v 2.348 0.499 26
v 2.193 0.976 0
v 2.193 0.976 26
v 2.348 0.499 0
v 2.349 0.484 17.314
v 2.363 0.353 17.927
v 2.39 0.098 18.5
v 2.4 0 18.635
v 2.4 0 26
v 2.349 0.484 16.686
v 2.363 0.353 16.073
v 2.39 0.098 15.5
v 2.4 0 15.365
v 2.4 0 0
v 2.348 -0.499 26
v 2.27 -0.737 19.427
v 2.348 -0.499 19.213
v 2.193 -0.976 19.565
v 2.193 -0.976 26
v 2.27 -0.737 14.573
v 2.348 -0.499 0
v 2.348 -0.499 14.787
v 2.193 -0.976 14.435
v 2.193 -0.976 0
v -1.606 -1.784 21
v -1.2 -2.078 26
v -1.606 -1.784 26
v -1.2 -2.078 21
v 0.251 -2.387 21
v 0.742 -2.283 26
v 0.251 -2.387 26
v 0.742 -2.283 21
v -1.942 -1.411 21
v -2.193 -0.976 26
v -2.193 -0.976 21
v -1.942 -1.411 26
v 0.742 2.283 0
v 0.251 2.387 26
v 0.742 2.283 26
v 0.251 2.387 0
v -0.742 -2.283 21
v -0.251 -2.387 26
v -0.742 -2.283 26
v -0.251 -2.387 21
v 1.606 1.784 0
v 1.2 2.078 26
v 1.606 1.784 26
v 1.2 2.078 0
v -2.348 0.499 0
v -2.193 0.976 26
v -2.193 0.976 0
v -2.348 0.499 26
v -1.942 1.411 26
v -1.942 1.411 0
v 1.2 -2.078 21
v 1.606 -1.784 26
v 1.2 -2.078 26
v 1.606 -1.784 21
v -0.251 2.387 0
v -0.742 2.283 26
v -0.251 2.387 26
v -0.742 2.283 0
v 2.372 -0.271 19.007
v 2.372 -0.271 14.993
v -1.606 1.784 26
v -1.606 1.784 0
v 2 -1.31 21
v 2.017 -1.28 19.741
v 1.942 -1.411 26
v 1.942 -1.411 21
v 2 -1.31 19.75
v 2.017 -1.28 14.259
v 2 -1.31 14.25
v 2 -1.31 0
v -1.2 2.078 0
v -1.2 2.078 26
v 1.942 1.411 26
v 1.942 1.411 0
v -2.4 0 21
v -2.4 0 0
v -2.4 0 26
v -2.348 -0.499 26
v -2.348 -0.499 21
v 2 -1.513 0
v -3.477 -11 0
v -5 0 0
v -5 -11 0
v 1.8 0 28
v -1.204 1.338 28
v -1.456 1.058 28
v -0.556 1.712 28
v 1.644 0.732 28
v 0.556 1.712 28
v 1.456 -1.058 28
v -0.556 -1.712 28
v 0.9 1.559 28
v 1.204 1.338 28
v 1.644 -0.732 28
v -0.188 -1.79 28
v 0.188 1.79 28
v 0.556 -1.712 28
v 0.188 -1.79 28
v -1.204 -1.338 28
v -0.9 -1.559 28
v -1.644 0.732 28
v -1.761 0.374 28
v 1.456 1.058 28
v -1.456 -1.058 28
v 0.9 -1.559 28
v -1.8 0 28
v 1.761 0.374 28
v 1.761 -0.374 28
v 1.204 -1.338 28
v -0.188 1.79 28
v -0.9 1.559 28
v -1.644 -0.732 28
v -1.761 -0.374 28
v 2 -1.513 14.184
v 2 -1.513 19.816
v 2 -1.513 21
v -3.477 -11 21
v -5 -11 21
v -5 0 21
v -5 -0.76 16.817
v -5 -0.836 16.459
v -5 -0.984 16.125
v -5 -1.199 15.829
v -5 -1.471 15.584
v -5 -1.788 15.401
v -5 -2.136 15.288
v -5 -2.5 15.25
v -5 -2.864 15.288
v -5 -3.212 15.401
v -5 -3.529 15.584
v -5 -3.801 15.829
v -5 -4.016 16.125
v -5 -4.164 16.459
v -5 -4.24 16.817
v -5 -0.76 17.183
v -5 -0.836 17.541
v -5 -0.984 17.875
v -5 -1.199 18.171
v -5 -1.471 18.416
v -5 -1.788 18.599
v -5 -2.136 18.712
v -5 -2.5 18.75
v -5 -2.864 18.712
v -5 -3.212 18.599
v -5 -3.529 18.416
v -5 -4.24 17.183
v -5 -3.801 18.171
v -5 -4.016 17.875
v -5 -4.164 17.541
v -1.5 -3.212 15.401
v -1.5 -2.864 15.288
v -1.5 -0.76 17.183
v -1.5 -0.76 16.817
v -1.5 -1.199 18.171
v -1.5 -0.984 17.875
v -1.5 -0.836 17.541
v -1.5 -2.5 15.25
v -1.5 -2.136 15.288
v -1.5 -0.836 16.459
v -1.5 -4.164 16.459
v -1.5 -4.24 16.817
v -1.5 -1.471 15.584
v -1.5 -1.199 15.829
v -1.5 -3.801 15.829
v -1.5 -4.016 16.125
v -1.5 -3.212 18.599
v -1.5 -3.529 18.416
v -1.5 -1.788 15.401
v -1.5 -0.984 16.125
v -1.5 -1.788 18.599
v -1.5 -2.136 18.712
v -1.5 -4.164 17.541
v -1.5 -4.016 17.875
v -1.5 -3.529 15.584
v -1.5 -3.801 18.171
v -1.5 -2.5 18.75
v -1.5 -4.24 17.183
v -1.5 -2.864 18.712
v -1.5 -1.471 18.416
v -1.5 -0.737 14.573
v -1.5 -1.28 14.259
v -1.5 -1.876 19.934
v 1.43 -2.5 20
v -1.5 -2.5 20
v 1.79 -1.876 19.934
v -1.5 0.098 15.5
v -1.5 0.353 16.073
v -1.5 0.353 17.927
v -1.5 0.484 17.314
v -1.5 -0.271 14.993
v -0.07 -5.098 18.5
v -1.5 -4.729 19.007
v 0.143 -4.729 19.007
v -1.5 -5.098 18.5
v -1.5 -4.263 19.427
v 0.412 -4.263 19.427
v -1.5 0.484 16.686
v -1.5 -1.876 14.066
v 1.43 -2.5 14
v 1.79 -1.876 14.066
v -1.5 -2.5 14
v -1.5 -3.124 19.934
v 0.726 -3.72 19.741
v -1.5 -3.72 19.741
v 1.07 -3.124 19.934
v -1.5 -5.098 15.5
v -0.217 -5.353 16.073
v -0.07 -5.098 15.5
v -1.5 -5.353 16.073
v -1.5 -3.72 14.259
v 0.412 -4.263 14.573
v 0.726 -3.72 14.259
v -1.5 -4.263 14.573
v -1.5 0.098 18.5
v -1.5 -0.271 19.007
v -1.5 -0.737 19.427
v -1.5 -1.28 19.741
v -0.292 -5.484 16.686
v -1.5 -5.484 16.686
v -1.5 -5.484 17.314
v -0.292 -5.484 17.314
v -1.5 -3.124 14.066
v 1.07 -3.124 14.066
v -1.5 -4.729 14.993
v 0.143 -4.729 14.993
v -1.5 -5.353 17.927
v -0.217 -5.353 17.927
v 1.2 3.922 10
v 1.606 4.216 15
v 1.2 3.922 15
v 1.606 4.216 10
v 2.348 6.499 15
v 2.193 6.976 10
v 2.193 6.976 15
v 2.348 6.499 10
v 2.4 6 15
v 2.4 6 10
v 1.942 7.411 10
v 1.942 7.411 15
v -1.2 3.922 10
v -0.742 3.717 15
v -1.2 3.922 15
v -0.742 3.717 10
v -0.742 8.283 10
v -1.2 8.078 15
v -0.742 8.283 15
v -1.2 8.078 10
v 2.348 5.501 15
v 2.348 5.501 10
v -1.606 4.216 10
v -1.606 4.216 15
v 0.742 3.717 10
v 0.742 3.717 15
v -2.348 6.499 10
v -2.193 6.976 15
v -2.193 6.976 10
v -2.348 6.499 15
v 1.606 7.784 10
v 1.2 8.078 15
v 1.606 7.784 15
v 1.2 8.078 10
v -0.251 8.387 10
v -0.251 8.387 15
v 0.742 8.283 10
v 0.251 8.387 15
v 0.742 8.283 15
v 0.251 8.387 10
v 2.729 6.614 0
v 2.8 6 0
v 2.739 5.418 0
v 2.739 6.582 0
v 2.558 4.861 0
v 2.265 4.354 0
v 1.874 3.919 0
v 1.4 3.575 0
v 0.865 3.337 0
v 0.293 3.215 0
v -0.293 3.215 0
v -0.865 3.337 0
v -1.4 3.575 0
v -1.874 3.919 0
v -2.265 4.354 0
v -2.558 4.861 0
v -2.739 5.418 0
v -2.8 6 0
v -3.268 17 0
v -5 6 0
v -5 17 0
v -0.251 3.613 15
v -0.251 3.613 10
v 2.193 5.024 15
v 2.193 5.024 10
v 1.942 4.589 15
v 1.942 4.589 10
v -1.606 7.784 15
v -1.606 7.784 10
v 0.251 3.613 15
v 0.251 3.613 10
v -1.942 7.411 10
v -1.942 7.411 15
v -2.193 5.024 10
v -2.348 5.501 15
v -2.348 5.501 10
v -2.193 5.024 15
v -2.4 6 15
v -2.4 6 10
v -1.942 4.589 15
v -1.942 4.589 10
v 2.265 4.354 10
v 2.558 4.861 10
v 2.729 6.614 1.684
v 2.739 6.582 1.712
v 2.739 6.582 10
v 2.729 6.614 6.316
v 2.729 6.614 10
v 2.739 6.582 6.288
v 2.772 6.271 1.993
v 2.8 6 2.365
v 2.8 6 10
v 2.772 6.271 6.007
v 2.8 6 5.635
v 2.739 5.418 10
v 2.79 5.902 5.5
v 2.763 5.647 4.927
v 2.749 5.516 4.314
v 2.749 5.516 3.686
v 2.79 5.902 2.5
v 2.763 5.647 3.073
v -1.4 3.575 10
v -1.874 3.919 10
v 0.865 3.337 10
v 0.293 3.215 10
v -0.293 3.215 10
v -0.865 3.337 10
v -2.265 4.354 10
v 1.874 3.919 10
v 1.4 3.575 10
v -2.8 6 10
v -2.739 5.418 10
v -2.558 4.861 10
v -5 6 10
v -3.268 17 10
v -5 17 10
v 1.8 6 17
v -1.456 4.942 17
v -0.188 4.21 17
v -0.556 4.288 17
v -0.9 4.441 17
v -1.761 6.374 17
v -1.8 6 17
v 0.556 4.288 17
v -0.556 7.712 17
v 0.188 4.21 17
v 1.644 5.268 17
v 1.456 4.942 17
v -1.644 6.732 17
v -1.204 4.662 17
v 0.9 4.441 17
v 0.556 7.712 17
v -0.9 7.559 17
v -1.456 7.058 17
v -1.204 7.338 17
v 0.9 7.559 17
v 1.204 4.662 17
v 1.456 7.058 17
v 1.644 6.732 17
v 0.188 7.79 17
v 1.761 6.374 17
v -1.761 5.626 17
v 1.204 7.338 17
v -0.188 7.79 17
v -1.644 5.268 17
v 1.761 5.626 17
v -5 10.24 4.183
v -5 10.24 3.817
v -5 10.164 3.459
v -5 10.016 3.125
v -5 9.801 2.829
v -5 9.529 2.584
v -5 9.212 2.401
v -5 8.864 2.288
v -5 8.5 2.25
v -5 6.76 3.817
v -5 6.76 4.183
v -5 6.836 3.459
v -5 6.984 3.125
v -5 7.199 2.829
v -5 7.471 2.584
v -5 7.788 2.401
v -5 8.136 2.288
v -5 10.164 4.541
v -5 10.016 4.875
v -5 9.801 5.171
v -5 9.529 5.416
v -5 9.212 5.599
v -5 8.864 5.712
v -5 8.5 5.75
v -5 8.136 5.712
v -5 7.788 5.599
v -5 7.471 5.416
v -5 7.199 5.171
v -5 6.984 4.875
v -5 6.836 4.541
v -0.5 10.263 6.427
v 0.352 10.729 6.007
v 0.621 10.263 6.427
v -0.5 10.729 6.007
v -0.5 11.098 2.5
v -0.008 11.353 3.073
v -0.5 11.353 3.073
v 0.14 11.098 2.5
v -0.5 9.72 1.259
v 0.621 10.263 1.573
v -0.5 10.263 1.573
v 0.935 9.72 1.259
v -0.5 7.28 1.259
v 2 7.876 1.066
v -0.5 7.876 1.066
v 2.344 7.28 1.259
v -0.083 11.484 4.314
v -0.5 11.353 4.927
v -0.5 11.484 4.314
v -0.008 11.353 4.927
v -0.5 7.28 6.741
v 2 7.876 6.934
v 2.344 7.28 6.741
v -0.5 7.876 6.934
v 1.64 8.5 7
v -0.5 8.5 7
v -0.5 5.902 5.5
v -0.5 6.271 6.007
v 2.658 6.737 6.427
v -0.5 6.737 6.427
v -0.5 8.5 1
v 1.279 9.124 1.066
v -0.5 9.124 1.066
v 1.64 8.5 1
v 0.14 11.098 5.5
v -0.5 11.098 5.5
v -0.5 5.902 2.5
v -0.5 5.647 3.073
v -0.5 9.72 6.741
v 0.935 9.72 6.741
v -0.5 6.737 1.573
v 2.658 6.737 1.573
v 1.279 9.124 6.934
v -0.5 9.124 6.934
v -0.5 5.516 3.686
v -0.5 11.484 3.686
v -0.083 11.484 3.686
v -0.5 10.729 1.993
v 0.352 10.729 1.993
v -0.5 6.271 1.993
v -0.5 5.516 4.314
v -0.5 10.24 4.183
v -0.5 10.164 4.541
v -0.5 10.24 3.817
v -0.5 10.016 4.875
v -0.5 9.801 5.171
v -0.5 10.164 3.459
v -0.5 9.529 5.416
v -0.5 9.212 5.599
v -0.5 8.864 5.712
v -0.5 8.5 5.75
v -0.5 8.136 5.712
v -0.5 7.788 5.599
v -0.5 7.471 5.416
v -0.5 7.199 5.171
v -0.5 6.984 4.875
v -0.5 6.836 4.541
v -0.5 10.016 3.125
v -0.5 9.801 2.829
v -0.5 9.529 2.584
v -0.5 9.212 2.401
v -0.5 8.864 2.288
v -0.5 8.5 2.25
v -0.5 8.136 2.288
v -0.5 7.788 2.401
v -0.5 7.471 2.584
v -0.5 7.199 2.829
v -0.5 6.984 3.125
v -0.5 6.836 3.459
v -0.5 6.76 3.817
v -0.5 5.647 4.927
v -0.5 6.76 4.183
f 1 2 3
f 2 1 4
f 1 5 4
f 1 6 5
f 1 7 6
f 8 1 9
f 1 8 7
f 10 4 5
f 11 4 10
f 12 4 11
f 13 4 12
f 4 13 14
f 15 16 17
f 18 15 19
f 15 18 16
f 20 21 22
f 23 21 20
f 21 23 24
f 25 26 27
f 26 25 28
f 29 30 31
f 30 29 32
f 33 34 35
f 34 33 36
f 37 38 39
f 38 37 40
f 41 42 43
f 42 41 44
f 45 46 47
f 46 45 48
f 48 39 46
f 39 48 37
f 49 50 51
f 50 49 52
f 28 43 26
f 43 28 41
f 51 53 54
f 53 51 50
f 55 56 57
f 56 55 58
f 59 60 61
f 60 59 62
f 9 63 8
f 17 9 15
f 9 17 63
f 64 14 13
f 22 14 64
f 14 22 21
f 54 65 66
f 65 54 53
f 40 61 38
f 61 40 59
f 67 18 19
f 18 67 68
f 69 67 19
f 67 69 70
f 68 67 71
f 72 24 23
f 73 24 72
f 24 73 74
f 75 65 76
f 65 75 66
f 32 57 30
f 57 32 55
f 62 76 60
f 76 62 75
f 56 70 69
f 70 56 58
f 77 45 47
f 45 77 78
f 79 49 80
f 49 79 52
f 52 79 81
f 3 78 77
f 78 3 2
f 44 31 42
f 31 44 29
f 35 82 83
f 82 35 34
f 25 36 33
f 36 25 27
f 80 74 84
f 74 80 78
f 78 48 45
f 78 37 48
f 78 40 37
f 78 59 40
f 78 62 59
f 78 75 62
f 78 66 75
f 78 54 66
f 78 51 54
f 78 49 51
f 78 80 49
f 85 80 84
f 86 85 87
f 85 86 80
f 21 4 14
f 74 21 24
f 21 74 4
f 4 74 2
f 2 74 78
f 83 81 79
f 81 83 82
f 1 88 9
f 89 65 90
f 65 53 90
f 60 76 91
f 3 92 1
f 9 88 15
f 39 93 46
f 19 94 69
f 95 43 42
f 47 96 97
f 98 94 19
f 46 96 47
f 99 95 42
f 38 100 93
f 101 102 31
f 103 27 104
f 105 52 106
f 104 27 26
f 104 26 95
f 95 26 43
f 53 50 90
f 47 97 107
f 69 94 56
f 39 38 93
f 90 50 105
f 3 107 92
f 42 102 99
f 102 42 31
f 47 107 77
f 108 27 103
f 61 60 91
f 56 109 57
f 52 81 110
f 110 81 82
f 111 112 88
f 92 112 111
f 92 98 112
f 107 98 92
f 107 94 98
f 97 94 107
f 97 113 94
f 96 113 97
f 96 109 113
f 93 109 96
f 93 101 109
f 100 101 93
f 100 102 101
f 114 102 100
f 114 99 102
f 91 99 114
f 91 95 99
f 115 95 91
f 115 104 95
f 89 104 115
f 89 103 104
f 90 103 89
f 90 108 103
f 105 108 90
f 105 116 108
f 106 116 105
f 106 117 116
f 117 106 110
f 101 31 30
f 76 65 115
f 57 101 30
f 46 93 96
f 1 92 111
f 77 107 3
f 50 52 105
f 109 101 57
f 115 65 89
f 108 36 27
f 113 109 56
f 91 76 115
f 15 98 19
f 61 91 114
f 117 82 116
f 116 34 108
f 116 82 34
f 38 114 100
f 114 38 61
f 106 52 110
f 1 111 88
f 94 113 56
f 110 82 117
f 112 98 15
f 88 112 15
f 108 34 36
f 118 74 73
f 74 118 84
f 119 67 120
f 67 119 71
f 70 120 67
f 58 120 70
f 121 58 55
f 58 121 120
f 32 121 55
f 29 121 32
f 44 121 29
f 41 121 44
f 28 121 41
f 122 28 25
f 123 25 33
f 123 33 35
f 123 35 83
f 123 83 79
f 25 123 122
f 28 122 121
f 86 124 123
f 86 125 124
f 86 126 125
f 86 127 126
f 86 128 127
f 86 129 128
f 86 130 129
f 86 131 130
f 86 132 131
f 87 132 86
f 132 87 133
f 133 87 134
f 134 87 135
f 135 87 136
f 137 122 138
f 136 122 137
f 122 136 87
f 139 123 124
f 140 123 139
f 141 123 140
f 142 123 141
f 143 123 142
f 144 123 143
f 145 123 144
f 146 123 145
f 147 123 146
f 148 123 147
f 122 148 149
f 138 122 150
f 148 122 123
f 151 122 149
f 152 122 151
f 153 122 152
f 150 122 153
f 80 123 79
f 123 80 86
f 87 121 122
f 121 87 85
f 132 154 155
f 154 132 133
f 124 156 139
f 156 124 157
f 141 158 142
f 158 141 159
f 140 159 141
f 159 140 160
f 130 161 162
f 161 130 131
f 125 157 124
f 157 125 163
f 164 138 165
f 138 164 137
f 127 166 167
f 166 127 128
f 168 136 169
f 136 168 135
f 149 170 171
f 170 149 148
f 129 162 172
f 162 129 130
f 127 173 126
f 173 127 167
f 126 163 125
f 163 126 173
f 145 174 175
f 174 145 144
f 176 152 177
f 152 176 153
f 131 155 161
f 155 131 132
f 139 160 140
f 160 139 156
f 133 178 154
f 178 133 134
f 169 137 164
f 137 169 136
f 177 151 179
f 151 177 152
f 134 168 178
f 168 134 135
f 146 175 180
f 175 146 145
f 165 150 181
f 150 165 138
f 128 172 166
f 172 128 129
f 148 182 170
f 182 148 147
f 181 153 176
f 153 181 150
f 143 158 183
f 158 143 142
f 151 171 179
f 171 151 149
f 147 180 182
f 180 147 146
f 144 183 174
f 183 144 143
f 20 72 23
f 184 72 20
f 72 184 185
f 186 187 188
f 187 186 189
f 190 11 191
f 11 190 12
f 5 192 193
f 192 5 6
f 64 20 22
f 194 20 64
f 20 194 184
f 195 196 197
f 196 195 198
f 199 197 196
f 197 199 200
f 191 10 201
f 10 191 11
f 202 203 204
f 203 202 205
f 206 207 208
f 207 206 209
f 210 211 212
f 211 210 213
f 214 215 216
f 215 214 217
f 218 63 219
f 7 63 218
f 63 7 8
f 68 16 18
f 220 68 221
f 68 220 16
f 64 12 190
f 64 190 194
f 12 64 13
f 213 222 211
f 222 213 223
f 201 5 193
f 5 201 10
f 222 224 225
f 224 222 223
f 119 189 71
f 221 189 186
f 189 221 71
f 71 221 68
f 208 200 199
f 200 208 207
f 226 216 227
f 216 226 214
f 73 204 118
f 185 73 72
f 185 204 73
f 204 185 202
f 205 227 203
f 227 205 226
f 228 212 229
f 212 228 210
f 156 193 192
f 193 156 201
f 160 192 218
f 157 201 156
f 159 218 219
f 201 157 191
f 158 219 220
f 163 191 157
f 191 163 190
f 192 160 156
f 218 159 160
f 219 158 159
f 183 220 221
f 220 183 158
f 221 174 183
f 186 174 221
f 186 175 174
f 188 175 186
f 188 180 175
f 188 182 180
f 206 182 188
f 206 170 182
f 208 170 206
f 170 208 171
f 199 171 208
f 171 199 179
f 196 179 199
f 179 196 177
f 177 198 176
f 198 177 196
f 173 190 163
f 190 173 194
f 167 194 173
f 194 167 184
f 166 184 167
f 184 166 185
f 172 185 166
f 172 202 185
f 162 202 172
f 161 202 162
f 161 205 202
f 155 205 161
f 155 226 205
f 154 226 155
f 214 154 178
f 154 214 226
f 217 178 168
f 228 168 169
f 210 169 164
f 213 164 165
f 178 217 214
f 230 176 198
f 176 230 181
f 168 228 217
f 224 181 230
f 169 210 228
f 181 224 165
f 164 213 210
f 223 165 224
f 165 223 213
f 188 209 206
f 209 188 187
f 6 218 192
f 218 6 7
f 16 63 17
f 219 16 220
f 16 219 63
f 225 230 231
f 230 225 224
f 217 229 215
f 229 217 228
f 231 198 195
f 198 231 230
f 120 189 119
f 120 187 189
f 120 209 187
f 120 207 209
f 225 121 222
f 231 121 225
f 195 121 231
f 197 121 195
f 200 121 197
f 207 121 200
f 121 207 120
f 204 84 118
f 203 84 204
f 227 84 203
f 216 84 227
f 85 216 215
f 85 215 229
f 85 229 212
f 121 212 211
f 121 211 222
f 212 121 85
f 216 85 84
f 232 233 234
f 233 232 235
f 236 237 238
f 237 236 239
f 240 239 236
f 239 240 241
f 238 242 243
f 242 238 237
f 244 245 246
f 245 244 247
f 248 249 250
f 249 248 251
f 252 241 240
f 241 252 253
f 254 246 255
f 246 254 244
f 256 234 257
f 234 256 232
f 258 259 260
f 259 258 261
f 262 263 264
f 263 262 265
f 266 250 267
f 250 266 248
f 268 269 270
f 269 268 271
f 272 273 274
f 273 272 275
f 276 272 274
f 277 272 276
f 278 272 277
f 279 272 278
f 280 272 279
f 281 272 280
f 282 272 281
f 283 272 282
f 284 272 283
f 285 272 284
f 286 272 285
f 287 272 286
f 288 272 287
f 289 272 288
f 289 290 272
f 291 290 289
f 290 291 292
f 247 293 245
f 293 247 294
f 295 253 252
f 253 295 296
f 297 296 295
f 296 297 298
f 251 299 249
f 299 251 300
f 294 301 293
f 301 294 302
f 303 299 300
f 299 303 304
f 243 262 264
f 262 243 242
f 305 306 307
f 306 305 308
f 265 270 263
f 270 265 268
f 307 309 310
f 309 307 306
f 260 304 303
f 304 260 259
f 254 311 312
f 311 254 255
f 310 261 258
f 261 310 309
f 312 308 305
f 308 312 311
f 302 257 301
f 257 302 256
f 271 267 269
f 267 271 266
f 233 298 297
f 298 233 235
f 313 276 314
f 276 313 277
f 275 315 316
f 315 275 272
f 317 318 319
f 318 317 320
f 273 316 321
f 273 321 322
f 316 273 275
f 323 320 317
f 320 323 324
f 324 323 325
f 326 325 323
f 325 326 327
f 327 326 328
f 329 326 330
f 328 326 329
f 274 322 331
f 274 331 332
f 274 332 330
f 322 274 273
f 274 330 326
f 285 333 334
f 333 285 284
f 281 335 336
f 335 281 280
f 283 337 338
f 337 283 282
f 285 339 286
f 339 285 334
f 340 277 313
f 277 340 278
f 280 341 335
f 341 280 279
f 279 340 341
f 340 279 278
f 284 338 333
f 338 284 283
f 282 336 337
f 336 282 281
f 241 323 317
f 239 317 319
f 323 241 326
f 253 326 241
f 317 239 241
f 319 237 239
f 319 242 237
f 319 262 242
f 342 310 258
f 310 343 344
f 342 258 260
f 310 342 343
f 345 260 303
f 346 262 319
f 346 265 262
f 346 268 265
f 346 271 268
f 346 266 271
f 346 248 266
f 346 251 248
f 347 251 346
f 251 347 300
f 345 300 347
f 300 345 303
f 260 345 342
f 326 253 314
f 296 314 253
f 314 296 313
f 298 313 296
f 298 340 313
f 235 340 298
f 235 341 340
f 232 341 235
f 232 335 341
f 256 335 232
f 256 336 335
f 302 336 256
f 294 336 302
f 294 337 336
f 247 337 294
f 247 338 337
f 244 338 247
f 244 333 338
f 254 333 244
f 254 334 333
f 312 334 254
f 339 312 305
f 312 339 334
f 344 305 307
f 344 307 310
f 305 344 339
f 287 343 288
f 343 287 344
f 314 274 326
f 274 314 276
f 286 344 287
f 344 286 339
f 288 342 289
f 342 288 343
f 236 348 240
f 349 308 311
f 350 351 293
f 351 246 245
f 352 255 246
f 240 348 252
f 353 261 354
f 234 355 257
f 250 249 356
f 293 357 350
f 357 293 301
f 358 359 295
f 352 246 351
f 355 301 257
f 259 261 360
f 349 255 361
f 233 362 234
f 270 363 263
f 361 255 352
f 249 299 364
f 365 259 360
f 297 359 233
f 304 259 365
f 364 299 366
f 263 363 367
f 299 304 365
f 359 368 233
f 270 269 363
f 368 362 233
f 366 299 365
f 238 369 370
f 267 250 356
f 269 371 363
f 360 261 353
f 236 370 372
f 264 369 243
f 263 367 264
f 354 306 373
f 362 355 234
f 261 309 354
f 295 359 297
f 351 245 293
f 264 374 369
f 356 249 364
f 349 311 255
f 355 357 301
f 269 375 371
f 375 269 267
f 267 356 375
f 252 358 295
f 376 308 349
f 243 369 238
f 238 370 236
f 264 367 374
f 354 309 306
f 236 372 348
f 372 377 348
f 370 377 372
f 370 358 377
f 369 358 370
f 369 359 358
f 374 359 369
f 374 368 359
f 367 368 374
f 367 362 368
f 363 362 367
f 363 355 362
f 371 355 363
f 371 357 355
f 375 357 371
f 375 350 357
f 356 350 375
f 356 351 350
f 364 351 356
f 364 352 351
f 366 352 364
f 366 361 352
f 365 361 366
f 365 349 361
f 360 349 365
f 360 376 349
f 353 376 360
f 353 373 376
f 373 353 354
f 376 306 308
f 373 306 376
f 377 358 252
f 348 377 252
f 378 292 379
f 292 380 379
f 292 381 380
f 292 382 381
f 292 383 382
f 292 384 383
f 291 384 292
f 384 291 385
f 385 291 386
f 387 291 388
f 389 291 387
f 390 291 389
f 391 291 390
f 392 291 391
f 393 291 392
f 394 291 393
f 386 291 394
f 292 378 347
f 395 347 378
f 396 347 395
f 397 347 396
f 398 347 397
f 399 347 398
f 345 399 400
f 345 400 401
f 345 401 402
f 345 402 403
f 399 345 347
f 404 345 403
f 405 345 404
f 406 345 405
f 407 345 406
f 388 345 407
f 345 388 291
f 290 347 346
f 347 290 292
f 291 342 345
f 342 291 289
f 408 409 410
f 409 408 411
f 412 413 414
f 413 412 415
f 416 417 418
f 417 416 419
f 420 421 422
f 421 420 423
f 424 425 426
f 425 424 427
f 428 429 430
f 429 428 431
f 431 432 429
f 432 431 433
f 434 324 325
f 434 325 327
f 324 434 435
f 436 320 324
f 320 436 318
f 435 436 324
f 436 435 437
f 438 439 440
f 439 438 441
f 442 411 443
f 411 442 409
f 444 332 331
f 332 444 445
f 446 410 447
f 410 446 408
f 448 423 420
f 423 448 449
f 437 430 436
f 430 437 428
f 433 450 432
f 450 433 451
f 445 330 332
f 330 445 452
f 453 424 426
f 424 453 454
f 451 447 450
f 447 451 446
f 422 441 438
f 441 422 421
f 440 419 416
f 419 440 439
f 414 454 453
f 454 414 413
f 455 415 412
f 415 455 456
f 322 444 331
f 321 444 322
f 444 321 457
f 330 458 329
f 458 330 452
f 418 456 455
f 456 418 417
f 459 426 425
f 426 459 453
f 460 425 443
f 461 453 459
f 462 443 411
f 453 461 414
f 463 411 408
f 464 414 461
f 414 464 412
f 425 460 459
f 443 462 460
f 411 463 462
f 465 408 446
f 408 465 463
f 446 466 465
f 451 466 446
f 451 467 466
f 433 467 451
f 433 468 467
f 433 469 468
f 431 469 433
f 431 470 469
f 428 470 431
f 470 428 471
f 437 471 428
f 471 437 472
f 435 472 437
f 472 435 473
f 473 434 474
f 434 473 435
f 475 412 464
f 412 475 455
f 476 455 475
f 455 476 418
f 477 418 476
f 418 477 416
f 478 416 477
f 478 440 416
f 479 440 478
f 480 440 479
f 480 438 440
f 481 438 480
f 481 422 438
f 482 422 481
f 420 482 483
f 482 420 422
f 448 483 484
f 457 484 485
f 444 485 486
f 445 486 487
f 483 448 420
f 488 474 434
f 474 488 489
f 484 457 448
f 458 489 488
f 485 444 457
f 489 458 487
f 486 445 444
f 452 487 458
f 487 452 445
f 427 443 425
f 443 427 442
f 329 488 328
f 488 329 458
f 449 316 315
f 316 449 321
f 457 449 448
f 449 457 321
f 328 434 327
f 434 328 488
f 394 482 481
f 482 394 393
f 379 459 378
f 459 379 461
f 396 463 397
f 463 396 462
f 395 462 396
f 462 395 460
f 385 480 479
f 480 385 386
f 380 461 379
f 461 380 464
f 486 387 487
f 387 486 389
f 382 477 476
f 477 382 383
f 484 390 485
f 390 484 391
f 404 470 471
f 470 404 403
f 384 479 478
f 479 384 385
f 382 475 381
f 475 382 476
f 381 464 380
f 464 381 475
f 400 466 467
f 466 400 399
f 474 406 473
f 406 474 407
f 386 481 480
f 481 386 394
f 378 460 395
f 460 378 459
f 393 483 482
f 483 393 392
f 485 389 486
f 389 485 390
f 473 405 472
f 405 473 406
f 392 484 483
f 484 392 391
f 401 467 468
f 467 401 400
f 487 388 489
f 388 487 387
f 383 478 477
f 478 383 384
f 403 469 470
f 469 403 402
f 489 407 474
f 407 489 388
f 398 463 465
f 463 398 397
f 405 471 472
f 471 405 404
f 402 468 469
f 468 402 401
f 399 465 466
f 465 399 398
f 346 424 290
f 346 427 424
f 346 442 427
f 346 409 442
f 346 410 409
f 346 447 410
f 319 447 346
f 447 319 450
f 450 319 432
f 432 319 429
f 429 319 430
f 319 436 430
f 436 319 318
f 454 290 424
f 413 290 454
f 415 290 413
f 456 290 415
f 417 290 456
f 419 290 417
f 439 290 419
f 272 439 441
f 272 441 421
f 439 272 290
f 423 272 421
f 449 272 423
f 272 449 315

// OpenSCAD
// PRUSA iteration3
// RAMBo cover hinges
// GNU GPL v3
// Josef Průša <iam@josefprusa.cz> and contributors
// http://www.reprap.org/wiki/Prusa_Mendel
// http://prusamendel.org

module upper_hinge(){
  difference(){
    union(){
      // Body.
      cylinder( h=26,r=2.4,$fn=30);
      translate([0,0,26]) cylinder(h=2,r1=2.4,r2=1.8,$fn=30);
      translate([-5,-11,0]) cube([7,11,21]);
    }
    // M3 screw hole .
    translate([-12.5,-2.5,17]) rotate( [0,90,0]) cylinder(h=20,r=1.75,$fn=30);
    translate([-1.5,-2.5,17]) rotate( [0,90,0]) cylinder(h=9,r=3,$fn=30);
    // Angle cut.
    translate([-2.9,-20,-1]) rotate([0,0,60]) cube([25,5,26]);
  }
}

module lower_hinge(){
  difference(){
    union(){
      // Body.
      translate([0,6,0]) cylinder( h=15,r=2.4,$fn=30);
      translate([0,6,0]) cylinder( h=10,r=2.8,$fn=30);
      translate([0,6,15]) cylinder( h=2,r1=2.4,r2=1.8,$fn=30);
      translate([-5,6,0]) cube([7,11,10]);
    }
    // M3 screw.
    translate([-0.5,8.5,4]) rotate( [0,90,0]) cylinder(h=20,r=3,$fn=30);
    translate([-12,8.5,4]) rotate( [0,90,0]) cylinder(h=20,r=1.75,$fn=30);
    // angle cut
    translate([-5,20,-1]) rotate([0,0,-60]) cube([20,5,20]);
  }
}

upper_hinge();
lower_hinge();
